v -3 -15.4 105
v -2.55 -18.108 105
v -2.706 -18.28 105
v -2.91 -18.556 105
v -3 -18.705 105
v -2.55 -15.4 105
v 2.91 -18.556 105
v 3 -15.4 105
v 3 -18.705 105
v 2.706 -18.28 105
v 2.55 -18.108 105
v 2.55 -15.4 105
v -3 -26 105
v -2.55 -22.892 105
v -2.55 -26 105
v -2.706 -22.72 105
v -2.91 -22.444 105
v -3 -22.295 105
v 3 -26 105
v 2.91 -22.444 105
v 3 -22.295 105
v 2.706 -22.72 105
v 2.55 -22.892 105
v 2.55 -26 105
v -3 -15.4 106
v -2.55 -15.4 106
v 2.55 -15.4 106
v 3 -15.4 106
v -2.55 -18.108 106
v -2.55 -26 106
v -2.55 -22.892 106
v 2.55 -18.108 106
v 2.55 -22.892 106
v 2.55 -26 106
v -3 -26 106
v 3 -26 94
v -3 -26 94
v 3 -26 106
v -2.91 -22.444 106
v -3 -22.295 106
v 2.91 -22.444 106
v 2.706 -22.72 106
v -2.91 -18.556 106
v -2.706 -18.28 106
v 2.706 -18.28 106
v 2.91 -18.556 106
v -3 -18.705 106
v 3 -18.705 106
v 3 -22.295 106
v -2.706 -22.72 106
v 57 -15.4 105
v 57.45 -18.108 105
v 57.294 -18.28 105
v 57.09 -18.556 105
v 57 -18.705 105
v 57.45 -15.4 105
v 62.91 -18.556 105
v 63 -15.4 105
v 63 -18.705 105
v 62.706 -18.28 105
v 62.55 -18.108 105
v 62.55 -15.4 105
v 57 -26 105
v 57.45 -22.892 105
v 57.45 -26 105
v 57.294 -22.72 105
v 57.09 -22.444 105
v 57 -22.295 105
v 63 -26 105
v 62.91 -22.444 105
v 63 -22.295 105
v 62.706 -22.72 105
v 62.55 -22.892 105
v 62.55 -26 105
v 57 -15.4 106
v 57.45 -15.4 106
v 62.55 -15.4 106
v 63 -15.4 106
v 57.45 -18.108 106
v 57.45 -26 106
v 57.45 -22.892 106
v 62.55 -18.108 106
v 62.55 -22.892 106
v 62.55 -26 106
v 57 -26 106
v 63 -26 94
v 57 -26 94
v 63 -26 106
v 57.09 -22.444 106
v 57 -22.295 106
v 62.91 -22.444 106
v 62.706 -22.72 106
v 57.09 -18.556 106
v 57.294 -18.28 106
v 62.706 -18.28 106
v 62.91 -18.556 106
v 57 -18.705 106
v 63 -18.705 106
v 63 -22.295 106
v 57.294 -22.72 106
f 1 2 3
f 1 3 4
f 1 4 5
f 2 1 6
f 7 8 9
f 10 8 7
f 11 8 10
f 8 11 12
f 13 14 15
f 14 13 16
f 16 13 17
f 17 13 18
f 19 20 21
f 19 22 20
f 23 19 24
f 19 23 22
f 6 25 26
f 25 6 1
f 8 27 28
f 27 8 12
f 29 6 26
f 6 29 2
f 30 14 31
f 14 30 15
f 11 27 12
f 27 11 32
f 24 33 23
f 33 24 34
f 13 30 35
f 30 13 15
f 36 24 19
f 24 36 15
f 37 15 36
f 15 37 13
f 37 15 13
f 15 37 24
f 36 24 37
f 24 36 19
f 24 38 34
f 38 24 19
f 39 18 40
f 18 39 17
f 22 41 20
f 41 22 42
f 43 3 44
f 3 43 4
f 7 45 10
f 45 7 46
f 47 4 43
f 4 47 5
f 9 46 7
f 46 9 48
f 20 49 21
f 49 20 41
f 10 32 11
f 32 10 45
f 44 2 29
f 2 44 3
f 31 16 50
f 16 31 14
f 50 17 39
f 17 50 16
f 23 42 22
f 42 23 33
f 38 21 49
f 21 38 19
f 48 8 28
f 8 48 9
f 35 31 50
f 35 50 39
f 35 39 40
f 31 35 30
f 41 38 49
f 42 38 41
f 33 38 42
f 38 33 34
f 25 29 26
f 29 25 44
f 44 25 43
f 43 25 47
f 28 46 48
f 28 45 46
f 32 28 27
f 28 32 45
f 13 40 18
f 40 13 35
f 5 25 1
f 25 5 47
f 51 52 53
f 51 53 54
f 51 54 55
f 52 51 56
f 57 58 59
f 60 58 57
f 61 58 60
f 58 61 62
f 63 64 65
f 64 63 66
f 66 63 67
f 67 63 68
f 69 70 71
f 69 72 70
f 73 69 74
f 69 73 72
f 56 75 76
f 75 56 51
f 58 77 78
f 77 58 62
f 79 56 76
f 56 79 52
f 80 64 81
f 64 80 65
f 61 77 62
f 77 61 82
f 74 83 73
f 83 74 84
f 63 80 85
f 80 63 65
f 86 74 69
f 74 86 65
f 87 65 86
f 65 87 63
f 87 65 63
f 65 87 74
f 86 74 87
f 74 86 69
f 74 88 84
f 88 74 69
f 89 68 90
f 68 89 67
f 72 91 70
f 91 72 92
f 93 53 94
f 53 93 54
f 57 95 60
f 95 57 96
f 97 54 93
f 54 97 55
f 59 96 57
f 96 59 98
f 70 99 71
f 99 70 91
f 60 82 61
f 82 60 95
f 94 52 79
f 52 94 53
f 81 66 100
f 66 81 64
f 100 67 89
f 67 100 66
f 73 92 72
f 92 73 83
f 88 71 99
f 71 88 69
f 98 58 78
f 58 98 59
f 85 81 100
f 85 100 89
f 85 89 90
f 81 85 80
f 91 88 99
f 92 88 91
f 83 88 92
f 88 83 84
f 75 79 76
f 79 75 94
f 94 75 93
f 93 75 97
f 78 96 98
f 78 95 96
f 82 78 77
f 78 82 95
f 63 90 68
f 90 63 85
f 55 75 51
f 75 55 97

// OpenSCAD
// file: ../port_tower.scad
// ============================================================
//  Female port tower: positioning stage (rotated 180 deg so its
//  payload face looks toward -Y) + bracket plate with the keyed
//  D-hole. The bulkhead goes in from the back (flange behind the
//  plate), nut on the front. Plate front face is at world y=0.
// ============================================================
include <stage.scad>

bracket_w      = 36;
bracket_hole_dz = port_z - stage_payload_z;   // hole above payload centre
bracket_bot    = -zs_h / 2;
bracket_top    = bracket_hole_dz + bh_nut_af / cos(30) / 2 + 3;
rib_t          = 5;     // rib width (X)
rib_d          = 7;     // rib depth (out of the plate front)

// Payload-face coordinates: origin at face centre, +Y away from the stage.
module port_bracket() {
    difference() {
        union() {
            translate([-bracket_w / 2, 0, bracket_bot]) cube([bracket_w, plate_t, bracket_top - bracket_bot]);
            // stiffening ribs, outboard of the nut and clear of the plug clamp
            for (sx = [-1, 1])
                translate([sx > 0 ? bracket_w / 2 - rib_t : -bracket_w / 2, plate_t - 0.01, bracket_bot])
                    hull() {
                        cube([rib_t, rib_d, 1]);
                        translate([0, 0, bracket_hole_dz - 14]) cube([rib_t, 0.01, 1]);
                    }
        }
        // keyed D-hole, flat on top
        translate([0, plate_t, bracket_hole_dz]) rotate([90, 0, 0]) d_hole(t = plate_t);
        // mounting screws into the z-slider's captive nuts
        for (p = payload_pts) translate([p[0], -0.01, p[1]]) rotate([-90, 0, 0]) {
            screw_hole(m3_d, plate_t + rib_d);
        }
    }
}

// Whole tower in world coordinates at fine-travel offset (dx, dz),
// measured in world X / Z.
// Tower B (i=1) is the mirror image so its X adjust screw faces outward.
module port_tower_world(i, dx = 0, dz = 0) {
    ldx = i == 0 ? -dx : dx;   // world dx -> stage-local dx
    translate([tower_x(i), tower_y, 0]) rotate([0, 0, 180]) stage_hand(i == 1) {
        stage_assembly(ldx, dz, base = false); // base is part of the X base
        stage_payload_origin(ldx, dz) show("port_bracket") color("Orange") port_bracket();
    }
}

// Bulkhead connector stand-in (for checks / preview), world coords.
module bulkhead_world(i, dx = 0, dz = 0) {
    translate([port_x[i] + dx, port_face_y, port_z + dz]) rotate([90, 0, 0]) show("bulkhead") color("DimGray") {
        cylinder(d = bh_thread_d, h = bh_thread_len - plate_t);                   // thread + face
        cylinder(d = bh_nut_af / cos(30), h = bh_nut_t, $fn = 6);                  // nut
        translate([0, 0, -plate_t - 2]) cylinder(d = bh_flange_d, h = 2);          // flange
        translate([0, 0, -plate_t - 40]) cylinder(d = 14, h = 38);                 // body
    }
}

echo("CHECK", "port_z", port_z);
// file: ../plug_mount.scad
// ============================================================
//  Male plug mount: flexure (frame + 4 L-beams + floating island with
//  the clamp cradle built in), clamp cap, and two identical stop
//  straps (front + back) whose pins limit X/Z float to +/-flex_float
//  and whose 1 mm standoff limits Y float to +/-flex_stop_gap.
//  Local coords: origin at the stage payload face centre, +Y away from
//  the stage, Z relative to the payload centre.
// ============================================================
include <port_tower.scad>
include <axes.scad>

plug_dz = port_z - (yc_top + stage_payload_z); // plug centre above payload centre
blk_x = plug_bx / 2 + 0.1; // snug in X
blk_y0 = flex_t + clamp_wall; // block back face
blk_y1 = blk_y0 + plug_by; // block front face
blk_z0 = plug_dz + plug_drop; // block bottom
blk_z1 = blk_z0 + plug_block[2];
crad_x = blk_x + 5; // cradle half width
crad_y1 = blk_y1 - 0.4; // cradle stops short: cap clamps the block
cap_back_y = crad_y1;
crad_scr = blk_x + 2.5; // cradle screw X
lip_in = plug_bx / 2 - 0.45; // top lips overlap the block by 0.55 mm
relief_hole_d = 7; // through the lips, centred on the cable

isl_x = 19; // island half width
isl_z0 = blk_z0 - 1;
isl_z1 = isl_z0 + flex_isl_h;
flex_g = 6; // island-to-frame gap
in_x = isl_x + flex_g;
in_z0 = isl_z0 - flex_g;
in_z1 = isl_z1 + flex_g;
fr_bar = 5;
fr_x = in_x + fr_bar;
fr_z0 = -zs_h / 2;
fr_z1 = in_z1 + fr_bar;

pin_d = 4;
pin_z = isl_z1 - 4;
pin_hole = pin_d + 2 * flex_float;
strap_w = 8;
strap_t = 3;
strap_foot_w = 18;
strap_z0 = pin_z - 4;
strap_scr = [-5, 5]; // strap screw X (through the top bar)
strap_scr_z = (in_z1 + fr_z1) / 2;

// one L-beam: island bottom face -> down -> outward -> up -> frame side
leg = 3;
function beam_path(sx, sz) =
  let (
    zc = (isl_z0 + isl_z1) / 2,
    zi = sz < 0 ? isl_z0 : isl_z1,
    zh = zi + sz * leg,
    zv = zc + sz * (flex_g - 2 + 0.5),
    xv = sx * (isl_x + leg)
  ) [[sx * 10, zi], [sx * 10, zh], [xv, zh], [xv, zv], [sx * in_x, zv]];

module poly_beam(pts, w) {
  for (k = [0:len(pts) - 2])
    hull() {
      translate(pts[k]) square(w, center=true);
      translate(pts[k + 1]) square(w, center=true);
    }
}

// XZ outline helpers: 2D (x, z) extruded along +Y from y0, thickness t
module xz_extrude(y0, t, convexity=4) { translate([0, y0 + t, 0]) rotate([90, 0, 0]) linear_extrude(height=t, convexity=convexity) children(); }

module plug_flexure() {
  difference() {
    union() {
      xz_extrude(0, flex_t) {
        difference() {
          translate([-fr_x, fr_z0]) square([2 * fr_x, fr_z1 - fr_z0]);
          translate([-in_x, in_z0]) square([2 * in_x, in_z1 - in_z0]);
        }
        translate([-isl_x, isl_z0]) square([2 * isl_x, isl_z1 - isl_z0]);
        for (sx = [-1, 1], sz = [-1, 1]) poly_beam(beam_path(sx, sz), flex_beam_w);
      }
      // clamp cradle on the island front: back wall + side walls
      translate([-crad_x, flex_t - 0.01, blk_z0]) cube([2 * crad_x, clamp_wall + 0.01, plug_block[2]]);
      for (sx = [-1, 1])
        translate([sx > 0 ? blk_x : -crad_x, blk_y0 - 0.01, blk_z0])
          cube([crad_x - blk_x, crad_y1 - blk_y0 + 0.01, plug_block[2]]);
      // Z retention: lips over the block's top corners, leaving a slot for
      // the cable. Nothing under the block: the plug's bent body hangs below.
      for (sx = [-1, 1])
        translate([sx > 0 ? lip_in : -crad_x, blk_y0 - 0.01, blk_z1])
          cube([crad_x - lip_in, crad_y1 - blk_y0 + 0.01, 1.5]);
    }
    // hole through the top lips for the cable strain relief (the plug goes
    // in from below)
    translate([0, blk_y0 + plug_by / 2, blk_z1 - 0.01]) cylinder(d=relief_hole_d, h=1.5 + 0.02);
    // payload screws into the stage z-slider
    for (p = payload_pts) translate([p[0], -0.5, p[1]]) rotate([-90, 0, 0]) screw_hole(m3_d, flex_t + 1);
    // stop-pin hole (through) and strap screws (through the top bar)
    translate([0, -0.5, pin_z]) rotate([-90, 0, 0]) screw_hole(pin_hole, flex_t + 1);
    for (x = strap_scr) translate([x, -0.5, strap_scr_z]) rotate([-90, 0, 0]) screw_hole(m3_d, flex_t + 1);
    // cap screws, tapped into the cradle side walls
    for (sx = [-1, 1])
      translate([sx * crad_scr, crad_y1 + 0.01, (blk_z0 + blk_z1) / 2])
        rotate([90, 0, 0]) screw_hole(m3_tap, crad_y1 - flex_t + 1);
  }
}

// Clamp cap: 1.5 mm over the block, thicker over the screws.
module plug_clamp_cap() {
  // flat back at the cradle front: squeezes the block (it stands 0.4 proud)
  difference() {
    union() {
      translate([-crad_x, cap_back_y, blk_z0]) cube([2 * crad_x, blk_y1 - cap_back_y + clamp_lip_t, plug_block[2]]);
      for (sx = [-1, 1])
        translate([sx > 0 ? blk_x : -crad_x, cap_back_y, blk_z0])
          cube([crad_x - blk_x, 4, plug_block[2]]);
    }
    for (sx = [-1, 1])
      translate([sx * crad_scr, cap_back_y - 0.01, (blk_z0 + blk_z1) / 2])
        rotate([-90, 0, 0]) screw_hole(m3_d, 5);
  }
}

// Stop strap in its own frame: back face on y=0, pin toward -Y.
module plug_flex_stop() {
  difference() {
    union() {
      translate([-strap_w / 2, 0, strap_z0]) cube([strap_w, strap_t, fr_z1 - strap_z0]);
      translate([-strap_foot_w / 2, -flex_stop_gap, in_z1]) cube([strap_foot_w, strap_t + flex_stop_gap, fr_z1 - in_z1]);
      translate([0, 0.01, pin_z]) rotate([90, 0, 0]) cylinder(d=pin_d, h=flex_stop_gap + 2);
    }
    for (x = strap_scr)
      translate([x, -flex_stop_gap - 0.5, strap_scr_z]) rotate([-90, 0, 0])
          screw_hole(m3_d, strap_t + flex_stop_gap + 1);
  }
}

module plug_flex_stops_placed() {
  translate([0, flex_t + flex_stop_gap, 0]) plug_flex_stop(); // front
  translate([0, -flex_stop_gap, 0]) mirror([0, 1, 0]) plug_flex_stop(); // back
}

// The plug, as separate pieces so a slide-in path can be swept piecewise:
// each piece is hulled with a copy moved by the vector sweep.
module plug_body_pieces(sweep = [0, 0, 0], relief = true) {
  module sw() { hull() { children(); translate(sweep) children(); } }
  sw() translate([-plug_bx / 2, blk_y0, blk_z0]) cube([plug_bx, plug_by, plug_block[2]]);
  if (relief) sw() translate([0, blk_y0 + plug_by / 2, blk_z1]) cylinder(d=plug_cable_d, h=15); // cable strain relief
  sw() hull() {
    translate([-plug_bx / 2, blk_y0, plug_dz - 4]) cube([plug_bx, plug_by, blk_z0 - plug_dz + 4]);
    translate([0, blk_y1 + plug_head_proj - 1, plug_dz]) rotate([-90, 0, 0]) cylinder(d=8, h=1);
  }
}
module plug_body_local() { show("usb_plug") color("White") plug_body_pieces(); }

// Everything that moves with the plug carriage, minus the plug itself.
module plug_mount_world(x_pos, y_pos, dx = 0, dz = 0) {
  o = ms_origin(x_pos, y_pos);
  translate(o) {
    stage_assembly(dx, dz, base = false); // base is part of the Y carriage
    stage_payload_origin(dx, dz) {
      show("plug_flexure") color("Orange") plug_flexure();
      show("plug_clamp_cap") color("Gold") plug_clamp_cap();
      show("plug_flex_stop") color("Khaki") plug_flex_stops_placed();
    }
  }
}
module plug_body_world(x_pos, y_pos, dx = 0, dz = 0) {
  o = ms_origin(x_pos, y_pos);
  translate(o) stage_payload_origin(dx, dz) plug_body_local();
}

// ---- checks ----
echo("CHECK", "clamp_lip_t", clamp_lip_t);
echo("CHECK", "clamp_preload", blk_y1 - cap_back_y);
echo("CHECK", "clamp_x_play", blk_x - plug_bx / 2);
echo("CHECK", "pillar_above_flex", pillar_top - (yc_top + stage_payload_z + fr_z1));
echo("CHECK", "clamp_bottom_above_plug", blk_z0 - plug_dz);
echo("CHECK", "clamp_lip_overlap", blk_x - lip_in);
// lip left over the block in front of / behind the relief hole (Y)
echo("CHECK", "lip_hold_y", (plug_by - relief_hole_d) / 2);
echo(
  "CHECK", "plug_insert_err",
  (ms_origin(0, y_travel)[1] + payload_face_y + blk_y1 + plug_head_proj) - bh_face_y
);
echo("CHECK", "flex_xz_stop", (pin_hole - pin_d) / 2);
// beam-to-island and beam-to-frame clearance must exceed the stop travel
echo("CHECK", "flex_beam_clear", leg - flex_beam_w / 2);
// file: ../assembly_lib.scad
// World-placement groups shared by assembly.scad and the full-machine
// collision test. Pinions are left out of these groups because they
// mesh with the racks by design.
include <plug_mount.scad>

module fixed_world() {
    for (i = [0, 1]) { port_tower_world(i); bulkhead_world(i); }
    show("x_base") color("Tan") x_base();
    x_servo_world();
}

module moving_world(x_pos, y_pos) {
    show("x_carriage") color("LightGreen") x_carriage_world(x_pos);
    y_servo_world(x_pos);
    show("y_carriage") color("Yellow") y_carriage_world(x_pos, y_pos);
    plug_mount_world(x_pos, y_pos);
}
// file: probe_lib.scad
// Fit probes built only from the port position and the measured part
// sizes (not from the bracket / clamp variables), so they test the real
// geometry rather than restating its formulas.
include <../assembly_lib.scad>

// Bulkhead thread cross-section (15 mm, flat 6.5 mm from centre, on top)
// pushed through port i's plate, offset by d = [dx, dz].
module probe_port_thread(i, d) {
    translate([port_x[i] + d[0], port_face_y + plate_t + 1, port_z + d[1]]) rotate([90, 0, 0])
        linear_extrude(plate_t + 2) intersection() {
            circle(d = bh_thread_d, $fn = 96);
            translate([-bh_thread_d, -bh_thread_d]) square([2 * bh_thread_d, bh_thread_d + bh_flat]);
        }
}
module probe_port_hole(d) {
    for (i = [0, 1]) intersection() { port_tower_world(i); probe_port_thread(i, d); }
}

// Plug clamp block where it must sit for the magnetic face to meet port
// i's face: face centre at (port_x, bh_face_y, port_z).
module probe_block(i, d) {
    translate([port_x[i] - plug_bx / 2 + d[0],
               bh_face_y - plug_head_proj - plug_by + d[1],
               port_z + plug_drop + d[2]])
        cube([plug_bx, plug_by, plug_block[2]]);
}
// Seat = flexure cradle only (the cap squeezes the block on purpose).
module probe_plug_seat(d) {
    for (i = [0, 1]) intersection() {
        translate(ms_origin(port_x[i], y_travel)) stage_payload_origin() plug_flexure();
        probe_block(i, d);
    }
}
// main file
// 1 mm high: must hit the top lips.
include <probe_lib.scad>
probe_plug_seat([0, 0, 1]);
